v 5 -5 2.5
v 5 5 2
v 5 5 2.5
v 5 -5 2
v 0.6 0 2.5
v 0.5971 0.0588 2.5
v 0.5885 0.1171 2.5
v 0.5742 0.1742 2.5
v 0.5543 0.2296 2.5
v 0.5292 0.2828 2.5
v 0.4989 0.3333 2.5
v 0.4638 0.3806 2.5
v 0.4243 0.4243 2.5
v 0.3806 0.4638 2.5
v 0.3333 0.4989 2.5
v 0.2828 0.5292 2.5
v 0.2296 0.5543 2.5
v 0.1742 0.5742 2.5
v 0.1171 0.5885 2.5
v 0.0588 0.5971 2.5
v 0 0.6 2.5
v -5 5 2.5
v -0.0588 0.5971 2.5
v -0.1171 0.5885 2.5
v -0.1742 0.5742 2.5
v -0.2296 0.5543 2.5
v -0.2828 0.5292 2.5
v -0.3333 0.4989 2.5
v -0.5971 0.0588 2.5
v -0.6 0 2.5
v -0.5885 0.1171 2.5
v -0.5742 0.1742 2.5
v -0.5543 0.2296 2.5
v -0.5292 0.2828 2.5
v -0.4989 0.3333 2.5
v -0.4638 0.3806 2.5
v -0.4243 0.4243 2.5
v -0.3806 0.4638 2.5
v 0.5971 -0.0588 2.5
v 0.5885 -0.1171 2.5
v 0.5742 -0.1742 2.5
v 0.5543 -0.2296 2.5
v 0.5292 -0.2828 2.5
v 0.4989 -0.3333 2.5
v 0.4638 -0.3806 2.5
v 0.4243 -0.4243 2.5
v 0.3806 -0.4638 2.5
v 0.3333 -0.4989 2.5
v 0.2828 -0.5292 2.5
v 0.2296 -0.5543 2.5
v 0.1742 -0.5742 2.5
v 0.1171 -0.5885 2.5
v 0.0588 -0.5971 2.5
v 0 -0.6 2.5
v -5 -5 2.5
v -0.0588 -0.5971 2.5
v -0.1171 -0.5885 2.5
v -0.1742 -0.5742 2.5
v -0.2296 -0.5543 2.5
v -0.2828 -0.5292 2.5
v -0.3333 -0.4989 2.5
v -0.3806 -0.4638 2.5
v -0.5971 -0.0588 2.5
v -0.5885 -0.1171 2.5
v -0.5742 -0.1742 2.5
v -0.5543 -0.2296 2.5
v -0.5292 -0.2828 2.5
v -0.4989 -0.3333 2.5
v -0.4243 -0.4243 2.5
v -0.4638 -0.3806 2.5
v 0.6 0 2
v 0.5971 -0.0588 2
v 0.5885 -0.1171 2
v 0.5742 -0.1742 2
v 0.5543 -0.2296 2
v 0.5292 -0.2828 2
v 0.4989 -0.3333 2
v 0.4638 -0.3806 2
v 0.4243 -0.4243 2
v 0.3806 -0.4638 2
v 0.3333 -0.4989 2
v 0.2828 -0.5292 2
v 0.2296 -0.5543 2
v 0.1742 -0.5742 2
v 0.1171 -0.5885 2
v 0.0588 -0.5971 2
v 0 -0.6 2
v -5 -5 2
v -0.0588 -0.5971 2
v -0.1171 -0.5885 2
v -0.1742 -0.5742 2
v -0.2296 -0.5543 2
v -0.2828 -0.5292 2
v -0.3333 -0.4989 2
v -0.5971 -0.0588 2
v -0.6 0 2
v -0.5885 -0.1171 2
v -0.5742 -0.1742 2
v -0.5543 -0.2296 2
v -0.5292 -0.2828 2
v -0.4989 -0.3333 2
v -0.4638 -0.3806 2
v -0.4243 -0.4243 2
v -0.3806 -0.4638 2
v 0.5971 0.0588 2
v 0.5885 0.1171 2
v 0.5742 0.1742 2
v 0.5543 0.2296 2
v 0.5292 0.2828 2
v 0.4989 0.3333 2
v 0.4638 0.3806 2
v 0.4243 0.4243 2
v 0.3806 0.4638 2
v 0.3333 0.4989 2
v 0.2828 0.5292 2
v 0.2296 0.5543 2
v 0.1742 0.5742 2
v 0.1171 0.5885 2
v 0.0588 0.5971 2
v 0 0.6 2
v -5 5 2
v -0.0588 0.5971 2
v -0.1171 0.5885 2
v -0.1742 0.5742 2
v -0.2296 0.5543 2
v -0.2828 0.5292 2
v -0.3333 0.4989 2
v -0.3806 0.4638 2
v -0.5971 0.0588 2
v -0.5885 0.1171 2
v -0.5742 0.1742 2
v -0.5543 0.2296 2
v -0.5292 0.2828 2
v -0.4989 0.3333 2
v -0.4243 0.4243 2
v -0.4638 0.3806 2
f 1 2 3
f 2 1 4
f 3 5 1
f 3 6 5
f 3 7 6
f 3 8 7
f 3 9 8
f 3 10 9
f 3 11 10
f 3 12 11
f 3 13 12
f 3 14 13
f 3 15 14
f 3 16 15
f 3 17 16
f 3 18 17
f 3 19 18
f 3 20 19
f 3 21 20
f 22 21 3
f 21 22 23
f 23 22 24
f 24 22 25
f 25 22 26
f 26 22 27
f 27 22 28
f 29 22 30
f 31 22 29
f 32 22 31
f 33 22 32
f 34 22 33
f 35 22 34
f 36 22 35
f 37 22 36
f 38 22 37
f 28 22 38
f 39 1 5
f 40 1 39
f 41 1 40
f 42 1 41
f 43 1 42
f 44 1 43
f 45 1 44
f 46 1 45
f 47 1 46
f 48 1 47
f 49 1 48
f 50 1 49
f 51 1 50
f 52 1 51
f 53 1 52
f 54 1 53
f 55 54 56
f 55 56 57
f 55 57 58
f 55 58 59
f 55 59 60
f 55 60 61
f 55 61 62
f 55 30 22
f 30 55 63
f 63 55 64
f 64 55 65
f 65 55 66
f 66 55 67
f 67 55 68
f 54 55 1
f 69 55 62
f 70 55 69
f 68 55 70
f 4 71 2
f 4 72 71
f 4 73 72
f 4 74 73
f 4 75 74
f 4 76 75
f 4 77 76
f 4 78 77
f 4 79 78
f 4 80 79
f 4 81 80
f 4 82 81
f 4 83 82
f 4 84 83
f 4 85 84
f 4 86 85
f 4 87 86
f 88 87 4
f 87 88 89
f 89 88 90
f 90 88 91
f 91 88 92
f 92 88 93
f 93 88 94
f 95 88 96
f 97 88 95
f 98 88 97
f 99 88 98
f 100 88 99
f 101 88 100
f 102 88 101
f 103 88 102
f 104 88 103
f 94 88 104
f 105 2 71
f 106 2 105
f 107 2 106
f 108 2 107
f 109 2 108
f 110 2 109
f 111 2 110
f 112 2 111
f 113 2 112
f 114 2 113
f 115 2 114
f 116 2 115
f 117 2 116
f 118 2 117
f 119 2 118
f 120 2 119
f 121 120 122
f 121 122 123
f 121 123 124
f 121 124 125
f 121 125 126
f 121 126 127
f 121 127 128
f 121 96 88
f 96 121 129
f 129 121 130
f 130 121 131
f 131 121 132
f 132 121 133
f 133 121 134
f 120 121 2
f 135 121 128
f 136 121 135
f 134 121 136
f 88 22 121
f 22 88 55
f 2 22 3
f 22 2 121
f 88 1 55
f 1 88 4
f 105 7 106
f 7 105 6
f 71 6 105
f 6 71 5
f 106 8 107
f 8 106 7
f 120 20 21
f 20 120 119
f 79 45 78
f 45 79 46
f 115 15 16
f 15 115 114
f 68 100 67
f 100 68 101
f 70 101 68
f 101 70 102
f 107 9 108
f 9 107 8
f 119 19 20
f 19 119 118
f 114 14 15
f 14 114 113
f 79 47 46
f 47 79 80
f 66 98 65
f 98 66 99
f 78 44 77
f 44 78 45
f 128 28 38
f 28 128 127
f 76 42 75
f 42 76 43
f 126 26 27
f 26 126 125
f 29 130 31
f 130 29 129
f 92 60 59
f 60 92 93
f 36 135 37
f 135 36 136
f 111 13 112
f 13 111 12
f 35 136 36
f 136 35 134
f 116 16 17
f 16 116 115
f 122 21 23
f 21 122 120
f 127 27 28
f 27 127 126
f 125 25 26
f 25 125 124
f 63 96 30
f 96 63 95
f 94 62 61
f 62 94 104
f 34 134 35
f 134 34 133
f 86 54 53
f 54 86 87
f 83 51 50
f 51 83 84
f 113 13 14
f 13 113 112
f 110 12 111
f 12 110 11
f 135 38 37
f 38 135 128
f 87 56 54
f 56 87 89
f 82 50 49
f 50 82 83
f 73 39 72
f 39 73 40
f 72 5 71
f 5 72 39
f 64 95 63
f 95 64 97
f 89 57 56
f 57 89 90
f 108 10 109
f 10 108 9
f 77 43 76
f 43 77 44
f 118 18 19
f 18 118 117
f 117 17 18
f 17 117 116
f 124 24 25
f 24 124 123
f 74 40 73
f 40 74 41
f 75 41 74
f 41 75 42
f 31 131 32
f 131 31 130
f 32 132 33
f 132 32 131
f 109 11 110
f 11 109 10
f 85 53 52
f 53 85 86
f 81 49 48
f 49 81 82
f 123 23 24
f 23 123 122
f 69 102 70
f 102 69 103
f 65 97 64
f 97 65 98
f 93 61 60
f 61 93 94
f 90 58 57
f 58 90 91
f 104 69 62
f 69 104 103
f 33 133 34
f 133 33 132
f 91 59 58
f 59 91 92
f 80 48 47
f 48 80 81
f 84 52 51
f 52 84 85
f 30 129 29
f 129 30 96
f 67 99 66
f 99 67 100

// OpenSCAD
// 載物臺
module stage() {
    stage_hole_r = 0.6;
    difference() {
        translate([0,0,2.25])
            cube([10,10,0.5], center=true);
        translate([0,0,2.5])
            cylinder(h=1, r=stage_hole_r, $fn=64, center=true);
    }
}

// 光圈圓盤
module aperture_disk() {
    aperture_r = 3.5;
    aperture_holes = [0.1, 0.2, 0.3, 0.4, 0.5, 0.6];
    z_trans = 2.25-0.4-0.15;
    center = [2,0,z_trans];
    difference() {
        translate(center) 
            cylinder(h=0.3, r=aperture_r, $fn=64, center=true);
        for(i=[0:5]) {
            angle = i*360/len(aperture_holes);
            length = center[0];
            r_hole = aperture_holes[i];
            x = center[0] + cos(angle)*length;
            y = center[1] + sin(angle)*length;
            translate([x, y, z_trans])
                cylinder(h=0.4, r=r_hole, $fn=32, center=true);
        }
    }
}
stage();
